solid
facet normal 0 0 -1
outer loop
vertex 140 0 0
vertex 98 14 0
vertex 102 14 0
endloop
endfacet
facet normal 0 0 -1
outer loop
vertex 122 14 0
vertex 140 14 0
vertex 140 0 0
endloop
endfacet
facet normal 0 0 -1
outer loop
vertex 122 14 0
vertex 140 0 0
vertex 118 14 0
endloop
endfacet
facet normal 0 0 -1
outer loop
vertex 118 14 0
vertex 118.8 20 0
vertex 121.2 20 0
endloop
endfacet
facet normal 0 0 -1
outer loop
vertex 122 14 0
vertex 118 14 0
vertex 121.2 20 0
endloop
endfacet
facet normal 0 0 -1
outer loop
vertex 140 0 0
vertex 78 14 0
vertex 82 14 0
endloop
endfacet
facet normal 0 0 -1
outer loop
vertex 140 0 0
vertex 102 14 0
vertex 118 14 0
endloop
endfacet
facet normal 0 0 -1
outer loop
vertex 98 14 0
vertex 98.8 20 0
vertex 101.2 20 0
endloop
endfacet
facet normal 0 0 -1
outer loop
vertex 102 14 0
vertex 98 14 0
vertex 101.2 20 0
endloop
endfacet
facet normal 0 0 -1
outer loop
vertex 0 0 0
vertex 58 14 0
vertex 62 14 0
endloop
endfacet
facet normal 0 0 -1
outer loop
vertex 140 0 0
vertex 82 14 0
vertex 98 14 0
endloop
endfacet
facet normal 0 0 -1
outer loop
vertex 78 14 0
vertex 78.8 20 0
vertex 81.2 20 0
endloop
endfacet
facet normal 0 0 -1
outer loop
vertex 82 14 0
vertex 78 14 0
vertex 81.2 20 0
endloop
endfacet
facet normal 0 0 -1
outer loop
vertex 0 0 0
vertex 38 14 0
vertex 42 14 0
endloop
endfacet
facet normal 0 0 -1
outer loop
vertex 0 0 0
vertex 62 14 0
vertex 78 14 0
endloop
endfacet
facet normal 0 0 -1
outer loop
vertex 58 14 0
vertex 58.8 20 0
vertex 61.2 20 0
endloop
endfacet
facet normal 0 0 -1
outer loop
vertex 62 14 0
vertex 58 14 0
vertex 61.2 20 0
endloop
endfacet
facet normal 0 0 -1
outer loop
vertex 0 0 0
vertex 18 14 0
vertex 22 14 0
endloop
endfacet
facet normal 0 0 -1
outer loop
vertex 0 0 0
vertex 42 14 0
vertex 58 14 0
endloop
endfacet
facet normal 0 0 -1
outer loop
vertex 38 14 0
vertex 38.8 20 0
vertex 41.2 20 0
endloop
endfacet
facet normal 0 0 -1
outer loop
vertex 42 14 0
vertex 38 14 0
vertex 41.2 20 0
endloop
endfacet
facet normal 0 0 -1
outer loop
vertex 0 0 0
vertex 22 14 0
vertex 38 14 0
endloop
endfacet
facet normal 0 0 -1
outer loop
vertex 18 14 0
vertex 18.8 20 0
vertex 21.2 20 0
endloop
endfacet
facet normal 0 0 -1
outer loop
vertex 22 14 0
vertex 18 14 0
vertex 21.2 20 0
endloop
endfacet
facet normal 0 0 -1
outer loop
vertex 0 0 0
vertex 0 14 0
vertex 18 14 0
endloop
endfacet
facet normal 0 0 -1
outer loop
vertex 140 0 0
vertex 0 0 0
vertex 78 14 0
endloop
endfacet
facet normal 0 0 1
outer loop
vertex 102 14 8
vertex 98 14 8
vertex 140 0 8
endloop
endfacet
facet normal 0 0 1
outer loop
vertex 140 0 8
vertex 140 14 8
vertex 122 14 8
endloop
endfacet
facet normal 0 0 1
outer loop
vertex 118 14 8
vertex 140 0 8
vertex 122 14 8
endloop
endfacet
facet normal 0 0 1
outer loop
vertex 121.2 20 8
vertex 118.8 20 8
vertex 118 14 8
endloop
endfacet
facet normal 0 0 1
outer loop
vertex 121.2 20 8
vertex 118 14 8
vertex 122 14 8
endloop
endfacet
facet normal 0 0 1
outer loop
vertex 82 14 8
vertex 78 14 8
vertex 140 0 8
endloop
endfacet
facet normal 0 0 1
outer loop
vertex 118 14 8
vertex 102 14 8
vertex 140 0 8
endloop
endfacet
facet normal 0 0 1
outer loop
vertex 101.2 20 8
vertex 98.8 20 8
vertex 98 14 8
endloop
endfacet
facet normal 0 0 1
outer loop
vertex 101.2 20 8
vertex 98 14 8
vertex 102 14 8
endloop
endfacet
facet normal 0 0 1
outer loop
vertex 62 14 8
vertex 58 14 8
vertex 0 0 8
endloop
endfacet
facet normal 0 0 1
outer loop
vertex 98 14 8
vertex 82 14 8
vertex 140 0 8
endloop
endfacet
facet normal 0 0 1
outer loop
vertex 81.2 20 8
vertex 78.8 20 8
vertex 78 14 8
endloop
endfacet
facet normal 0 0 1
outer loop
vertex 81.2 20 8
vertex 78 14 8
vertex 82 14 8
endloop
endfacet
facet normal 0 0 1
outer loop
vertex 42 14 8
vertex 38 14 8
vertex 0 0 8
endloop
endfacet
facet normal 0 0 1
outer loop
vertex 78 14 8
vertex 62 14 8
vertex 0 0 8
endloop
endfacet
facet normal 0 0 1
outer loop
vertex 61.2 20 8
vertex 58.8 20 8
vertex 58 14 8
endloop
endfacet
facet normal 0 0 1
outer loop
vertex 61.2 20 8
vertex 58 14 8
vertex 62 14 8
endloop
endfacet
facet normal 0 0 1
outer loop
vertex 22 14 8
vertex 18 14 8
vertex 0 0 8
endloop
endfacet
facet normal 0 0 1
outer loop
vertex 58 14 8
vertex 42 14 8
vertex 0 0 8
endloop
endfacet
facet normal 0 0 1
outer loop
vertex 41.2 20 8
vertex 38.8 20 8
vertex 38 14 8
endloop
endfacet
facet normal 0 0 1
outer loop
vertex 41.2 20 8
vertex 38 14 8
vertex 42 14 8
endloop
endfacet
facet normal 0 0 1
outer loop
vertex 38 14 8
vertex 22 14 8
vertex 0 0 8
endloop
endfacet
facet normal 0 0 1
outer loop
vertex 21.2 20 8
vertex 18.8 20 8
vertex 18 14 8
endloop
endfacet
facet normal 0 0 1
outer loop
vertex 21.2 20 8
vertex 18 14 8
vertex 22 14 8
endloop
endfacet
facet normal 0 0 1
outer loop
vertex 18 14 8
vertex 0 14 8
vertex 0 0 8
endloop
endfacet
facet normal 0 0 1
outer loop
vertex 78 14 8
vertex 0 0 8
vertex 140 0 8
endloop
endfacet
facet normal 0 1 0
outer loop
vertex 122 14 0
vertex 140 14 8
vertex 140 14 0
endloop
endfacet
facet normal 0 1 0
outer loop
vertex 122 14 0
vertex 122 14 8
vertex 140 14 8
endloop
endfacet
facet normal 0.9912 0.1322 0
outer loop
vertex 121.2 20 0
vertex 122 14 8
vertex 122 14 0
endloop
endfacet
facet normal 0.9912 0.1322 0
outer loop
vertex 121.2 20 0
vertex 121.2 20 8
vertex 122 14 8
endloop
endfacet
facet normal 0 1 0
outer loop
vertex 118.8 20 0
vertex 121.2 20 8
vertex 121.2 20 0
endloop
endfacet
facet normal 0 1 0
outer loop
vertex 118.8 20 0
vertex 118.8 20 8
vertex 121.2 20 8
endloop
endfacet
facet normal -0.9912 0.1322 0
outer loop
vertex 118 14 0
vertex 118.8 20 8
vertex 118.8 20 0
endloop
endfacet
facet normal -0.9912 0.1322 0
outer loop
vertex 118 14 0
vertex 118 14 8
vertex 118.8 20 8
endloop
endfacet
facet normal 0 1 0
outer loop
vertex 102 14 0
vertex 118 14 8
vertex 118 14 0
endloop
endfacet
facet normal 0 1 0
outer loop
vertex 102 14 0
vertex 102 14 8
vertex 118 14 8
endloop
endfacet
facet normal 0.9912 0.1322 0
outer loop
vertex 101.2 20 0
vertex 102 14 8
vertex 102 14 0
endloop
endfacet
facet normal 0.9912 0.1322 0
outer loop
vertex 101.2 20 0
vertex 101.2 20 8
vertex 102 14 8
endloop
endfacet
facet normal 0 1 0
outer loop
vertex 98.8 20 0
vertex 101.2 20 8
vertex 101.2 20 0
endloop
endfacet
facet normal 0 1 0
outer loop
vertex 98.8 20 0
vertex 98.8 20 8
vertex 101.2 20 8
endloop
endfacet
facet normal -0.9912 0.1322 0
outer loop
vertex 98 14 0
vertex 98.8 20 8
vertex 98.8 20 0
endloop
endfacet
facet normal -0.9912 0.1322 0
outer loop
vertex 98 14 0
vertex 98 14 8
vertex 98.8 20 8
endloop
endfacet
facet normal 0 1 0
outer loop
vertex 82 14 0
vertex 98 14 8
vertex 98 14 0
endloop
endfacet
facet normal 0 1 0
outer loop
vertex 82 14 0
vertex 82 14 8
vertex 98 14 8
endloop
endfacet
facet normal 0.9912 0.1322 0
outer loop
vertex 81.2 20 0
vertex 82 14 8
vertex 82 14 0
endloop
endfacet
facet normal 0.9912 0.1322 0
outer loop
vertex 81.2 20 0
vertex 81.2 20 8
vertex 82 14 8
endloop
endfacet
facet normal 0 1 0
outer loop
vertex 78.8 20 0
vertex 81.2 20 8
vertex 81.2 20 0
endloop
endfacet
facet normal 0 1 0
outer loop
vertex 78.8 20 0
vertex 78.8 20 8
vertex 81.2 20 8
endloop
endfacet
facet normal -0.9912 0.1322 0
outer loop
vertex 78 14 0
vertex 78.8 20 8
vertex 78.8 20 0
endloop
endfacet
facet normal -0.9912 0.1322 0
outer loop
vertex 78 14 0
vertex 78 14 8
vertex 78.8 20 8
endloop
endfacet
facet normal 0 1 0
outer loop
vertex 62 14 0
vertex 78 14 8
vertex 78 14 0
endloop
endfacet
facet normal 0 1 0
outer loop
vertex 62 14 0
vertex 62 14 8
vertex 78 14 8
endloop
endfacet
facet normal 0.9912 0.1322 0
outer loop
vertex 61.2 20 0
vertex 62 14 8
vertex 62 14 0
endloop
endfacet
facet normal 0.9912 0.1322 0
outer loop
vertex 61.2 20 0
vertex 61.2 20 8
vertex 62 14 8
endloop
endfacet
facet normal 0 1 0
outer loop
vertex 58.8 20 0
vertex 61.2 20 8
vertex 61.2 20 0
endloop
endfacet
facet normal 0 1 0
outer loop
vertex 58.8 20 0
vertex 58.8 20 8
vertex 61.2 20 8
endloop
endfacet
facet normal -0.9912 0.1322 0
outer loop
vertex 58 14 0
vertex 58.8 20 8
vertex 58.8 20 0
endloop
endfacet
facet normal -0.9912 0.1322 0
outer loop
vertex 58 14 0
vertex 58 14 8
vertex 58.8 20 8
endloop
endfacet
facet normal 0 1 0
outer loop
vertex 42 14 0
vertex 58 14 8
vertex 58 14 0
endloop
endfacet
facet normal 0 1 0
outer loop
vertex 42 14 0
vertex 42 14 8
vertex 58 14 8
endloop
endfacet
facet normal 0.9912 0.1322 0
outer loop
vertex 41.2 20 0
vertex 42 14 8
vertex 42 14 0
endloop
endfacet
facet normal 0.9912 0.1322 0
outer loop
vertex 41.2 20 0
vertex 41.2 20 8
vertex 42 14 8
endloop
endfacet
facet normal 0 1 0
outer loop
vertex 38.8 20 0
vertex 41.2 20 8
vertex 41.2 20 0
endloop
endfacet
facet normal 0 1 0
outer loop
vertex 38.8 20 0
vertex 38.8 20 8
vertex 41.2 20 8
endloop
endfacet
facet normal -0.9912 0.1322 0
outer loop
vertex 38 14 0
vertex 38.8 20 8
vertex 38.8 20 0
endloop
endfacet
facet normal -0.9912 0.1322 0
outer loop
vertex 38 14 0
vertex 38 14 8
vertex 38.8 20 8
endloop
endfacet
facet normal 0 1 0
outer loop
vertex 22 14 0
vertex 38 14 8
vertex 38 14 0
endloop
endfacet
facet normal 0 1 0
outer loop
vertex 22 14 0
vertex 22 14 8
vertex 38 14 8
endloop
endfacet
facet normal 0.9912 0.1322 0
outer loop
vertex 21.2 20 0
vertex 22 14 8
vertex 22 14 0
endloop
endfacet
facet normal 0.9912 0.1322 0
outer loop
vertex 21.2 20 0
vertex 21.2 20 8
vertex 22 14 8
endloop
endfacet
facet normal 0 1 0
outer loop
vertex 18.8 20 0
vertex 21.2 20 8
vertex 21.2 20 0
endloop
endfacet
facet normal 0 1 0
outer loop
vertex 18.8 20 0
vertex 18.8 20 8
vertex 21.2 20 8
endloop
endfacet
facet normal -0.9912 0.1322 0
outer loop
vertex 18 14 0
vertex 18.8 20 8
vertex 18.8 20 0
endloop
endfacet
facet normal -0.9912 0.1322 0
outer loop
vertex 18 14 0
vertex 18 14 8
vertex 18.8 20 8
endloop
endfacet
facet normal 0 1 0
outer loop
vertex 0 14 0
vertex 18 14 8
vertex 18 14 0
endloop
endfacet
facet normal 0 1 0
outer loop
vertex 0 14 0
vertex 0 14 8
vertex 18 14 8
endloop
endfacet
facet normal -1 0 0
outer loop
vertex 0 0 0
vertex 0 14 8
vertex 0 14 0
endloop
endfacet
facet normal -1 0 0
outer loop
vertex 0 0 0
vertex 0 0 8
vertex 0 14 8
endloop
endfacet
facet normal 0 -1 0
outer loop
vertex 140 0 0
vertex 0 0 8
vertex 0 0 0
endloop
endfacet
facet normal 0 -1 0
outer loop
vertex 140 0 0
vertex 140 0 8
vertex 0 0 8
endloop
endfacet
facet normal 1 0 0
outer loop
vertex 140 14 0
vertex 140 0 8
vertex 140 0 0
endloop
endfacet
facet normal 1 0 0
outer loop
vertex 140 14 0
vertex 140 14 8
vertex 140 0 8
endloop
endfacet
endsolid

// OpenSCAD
$fn = 32;

// ----------------------------------------------------------------------
// Gear rack: 6 teeth on a 140 mm bar, pitch 20 mm
// ----------------------------------------------------------------------

// --- parameters (mm) ---
profile_height = 8;       // extrusion height
profile_points = 28;      // points of the closed outline

profile = [[0, 0], [140, 0], [140, 14], [122, 14], [121.2, 20], [118.8, 20], [118, 14], [102, 14], [101.2, 20], [98.8, 20], [98, 14], [82, 14], [81.2, 20], [78.8, 20], [78, 14], [62, 14], [61.2, 20], [58.8, 20], [58, 14], [42, 14], [41.2, 20], [38.8, 20], [38, 14], [22, 14], [21.2, 20], [18.8, 20], [18, 14], [0, 14]];  // single closed polygon, 28 points, counter clockwise

// --- the one profile operation ---
linear_extrude(height = profile_height) polygon(points = profile);
